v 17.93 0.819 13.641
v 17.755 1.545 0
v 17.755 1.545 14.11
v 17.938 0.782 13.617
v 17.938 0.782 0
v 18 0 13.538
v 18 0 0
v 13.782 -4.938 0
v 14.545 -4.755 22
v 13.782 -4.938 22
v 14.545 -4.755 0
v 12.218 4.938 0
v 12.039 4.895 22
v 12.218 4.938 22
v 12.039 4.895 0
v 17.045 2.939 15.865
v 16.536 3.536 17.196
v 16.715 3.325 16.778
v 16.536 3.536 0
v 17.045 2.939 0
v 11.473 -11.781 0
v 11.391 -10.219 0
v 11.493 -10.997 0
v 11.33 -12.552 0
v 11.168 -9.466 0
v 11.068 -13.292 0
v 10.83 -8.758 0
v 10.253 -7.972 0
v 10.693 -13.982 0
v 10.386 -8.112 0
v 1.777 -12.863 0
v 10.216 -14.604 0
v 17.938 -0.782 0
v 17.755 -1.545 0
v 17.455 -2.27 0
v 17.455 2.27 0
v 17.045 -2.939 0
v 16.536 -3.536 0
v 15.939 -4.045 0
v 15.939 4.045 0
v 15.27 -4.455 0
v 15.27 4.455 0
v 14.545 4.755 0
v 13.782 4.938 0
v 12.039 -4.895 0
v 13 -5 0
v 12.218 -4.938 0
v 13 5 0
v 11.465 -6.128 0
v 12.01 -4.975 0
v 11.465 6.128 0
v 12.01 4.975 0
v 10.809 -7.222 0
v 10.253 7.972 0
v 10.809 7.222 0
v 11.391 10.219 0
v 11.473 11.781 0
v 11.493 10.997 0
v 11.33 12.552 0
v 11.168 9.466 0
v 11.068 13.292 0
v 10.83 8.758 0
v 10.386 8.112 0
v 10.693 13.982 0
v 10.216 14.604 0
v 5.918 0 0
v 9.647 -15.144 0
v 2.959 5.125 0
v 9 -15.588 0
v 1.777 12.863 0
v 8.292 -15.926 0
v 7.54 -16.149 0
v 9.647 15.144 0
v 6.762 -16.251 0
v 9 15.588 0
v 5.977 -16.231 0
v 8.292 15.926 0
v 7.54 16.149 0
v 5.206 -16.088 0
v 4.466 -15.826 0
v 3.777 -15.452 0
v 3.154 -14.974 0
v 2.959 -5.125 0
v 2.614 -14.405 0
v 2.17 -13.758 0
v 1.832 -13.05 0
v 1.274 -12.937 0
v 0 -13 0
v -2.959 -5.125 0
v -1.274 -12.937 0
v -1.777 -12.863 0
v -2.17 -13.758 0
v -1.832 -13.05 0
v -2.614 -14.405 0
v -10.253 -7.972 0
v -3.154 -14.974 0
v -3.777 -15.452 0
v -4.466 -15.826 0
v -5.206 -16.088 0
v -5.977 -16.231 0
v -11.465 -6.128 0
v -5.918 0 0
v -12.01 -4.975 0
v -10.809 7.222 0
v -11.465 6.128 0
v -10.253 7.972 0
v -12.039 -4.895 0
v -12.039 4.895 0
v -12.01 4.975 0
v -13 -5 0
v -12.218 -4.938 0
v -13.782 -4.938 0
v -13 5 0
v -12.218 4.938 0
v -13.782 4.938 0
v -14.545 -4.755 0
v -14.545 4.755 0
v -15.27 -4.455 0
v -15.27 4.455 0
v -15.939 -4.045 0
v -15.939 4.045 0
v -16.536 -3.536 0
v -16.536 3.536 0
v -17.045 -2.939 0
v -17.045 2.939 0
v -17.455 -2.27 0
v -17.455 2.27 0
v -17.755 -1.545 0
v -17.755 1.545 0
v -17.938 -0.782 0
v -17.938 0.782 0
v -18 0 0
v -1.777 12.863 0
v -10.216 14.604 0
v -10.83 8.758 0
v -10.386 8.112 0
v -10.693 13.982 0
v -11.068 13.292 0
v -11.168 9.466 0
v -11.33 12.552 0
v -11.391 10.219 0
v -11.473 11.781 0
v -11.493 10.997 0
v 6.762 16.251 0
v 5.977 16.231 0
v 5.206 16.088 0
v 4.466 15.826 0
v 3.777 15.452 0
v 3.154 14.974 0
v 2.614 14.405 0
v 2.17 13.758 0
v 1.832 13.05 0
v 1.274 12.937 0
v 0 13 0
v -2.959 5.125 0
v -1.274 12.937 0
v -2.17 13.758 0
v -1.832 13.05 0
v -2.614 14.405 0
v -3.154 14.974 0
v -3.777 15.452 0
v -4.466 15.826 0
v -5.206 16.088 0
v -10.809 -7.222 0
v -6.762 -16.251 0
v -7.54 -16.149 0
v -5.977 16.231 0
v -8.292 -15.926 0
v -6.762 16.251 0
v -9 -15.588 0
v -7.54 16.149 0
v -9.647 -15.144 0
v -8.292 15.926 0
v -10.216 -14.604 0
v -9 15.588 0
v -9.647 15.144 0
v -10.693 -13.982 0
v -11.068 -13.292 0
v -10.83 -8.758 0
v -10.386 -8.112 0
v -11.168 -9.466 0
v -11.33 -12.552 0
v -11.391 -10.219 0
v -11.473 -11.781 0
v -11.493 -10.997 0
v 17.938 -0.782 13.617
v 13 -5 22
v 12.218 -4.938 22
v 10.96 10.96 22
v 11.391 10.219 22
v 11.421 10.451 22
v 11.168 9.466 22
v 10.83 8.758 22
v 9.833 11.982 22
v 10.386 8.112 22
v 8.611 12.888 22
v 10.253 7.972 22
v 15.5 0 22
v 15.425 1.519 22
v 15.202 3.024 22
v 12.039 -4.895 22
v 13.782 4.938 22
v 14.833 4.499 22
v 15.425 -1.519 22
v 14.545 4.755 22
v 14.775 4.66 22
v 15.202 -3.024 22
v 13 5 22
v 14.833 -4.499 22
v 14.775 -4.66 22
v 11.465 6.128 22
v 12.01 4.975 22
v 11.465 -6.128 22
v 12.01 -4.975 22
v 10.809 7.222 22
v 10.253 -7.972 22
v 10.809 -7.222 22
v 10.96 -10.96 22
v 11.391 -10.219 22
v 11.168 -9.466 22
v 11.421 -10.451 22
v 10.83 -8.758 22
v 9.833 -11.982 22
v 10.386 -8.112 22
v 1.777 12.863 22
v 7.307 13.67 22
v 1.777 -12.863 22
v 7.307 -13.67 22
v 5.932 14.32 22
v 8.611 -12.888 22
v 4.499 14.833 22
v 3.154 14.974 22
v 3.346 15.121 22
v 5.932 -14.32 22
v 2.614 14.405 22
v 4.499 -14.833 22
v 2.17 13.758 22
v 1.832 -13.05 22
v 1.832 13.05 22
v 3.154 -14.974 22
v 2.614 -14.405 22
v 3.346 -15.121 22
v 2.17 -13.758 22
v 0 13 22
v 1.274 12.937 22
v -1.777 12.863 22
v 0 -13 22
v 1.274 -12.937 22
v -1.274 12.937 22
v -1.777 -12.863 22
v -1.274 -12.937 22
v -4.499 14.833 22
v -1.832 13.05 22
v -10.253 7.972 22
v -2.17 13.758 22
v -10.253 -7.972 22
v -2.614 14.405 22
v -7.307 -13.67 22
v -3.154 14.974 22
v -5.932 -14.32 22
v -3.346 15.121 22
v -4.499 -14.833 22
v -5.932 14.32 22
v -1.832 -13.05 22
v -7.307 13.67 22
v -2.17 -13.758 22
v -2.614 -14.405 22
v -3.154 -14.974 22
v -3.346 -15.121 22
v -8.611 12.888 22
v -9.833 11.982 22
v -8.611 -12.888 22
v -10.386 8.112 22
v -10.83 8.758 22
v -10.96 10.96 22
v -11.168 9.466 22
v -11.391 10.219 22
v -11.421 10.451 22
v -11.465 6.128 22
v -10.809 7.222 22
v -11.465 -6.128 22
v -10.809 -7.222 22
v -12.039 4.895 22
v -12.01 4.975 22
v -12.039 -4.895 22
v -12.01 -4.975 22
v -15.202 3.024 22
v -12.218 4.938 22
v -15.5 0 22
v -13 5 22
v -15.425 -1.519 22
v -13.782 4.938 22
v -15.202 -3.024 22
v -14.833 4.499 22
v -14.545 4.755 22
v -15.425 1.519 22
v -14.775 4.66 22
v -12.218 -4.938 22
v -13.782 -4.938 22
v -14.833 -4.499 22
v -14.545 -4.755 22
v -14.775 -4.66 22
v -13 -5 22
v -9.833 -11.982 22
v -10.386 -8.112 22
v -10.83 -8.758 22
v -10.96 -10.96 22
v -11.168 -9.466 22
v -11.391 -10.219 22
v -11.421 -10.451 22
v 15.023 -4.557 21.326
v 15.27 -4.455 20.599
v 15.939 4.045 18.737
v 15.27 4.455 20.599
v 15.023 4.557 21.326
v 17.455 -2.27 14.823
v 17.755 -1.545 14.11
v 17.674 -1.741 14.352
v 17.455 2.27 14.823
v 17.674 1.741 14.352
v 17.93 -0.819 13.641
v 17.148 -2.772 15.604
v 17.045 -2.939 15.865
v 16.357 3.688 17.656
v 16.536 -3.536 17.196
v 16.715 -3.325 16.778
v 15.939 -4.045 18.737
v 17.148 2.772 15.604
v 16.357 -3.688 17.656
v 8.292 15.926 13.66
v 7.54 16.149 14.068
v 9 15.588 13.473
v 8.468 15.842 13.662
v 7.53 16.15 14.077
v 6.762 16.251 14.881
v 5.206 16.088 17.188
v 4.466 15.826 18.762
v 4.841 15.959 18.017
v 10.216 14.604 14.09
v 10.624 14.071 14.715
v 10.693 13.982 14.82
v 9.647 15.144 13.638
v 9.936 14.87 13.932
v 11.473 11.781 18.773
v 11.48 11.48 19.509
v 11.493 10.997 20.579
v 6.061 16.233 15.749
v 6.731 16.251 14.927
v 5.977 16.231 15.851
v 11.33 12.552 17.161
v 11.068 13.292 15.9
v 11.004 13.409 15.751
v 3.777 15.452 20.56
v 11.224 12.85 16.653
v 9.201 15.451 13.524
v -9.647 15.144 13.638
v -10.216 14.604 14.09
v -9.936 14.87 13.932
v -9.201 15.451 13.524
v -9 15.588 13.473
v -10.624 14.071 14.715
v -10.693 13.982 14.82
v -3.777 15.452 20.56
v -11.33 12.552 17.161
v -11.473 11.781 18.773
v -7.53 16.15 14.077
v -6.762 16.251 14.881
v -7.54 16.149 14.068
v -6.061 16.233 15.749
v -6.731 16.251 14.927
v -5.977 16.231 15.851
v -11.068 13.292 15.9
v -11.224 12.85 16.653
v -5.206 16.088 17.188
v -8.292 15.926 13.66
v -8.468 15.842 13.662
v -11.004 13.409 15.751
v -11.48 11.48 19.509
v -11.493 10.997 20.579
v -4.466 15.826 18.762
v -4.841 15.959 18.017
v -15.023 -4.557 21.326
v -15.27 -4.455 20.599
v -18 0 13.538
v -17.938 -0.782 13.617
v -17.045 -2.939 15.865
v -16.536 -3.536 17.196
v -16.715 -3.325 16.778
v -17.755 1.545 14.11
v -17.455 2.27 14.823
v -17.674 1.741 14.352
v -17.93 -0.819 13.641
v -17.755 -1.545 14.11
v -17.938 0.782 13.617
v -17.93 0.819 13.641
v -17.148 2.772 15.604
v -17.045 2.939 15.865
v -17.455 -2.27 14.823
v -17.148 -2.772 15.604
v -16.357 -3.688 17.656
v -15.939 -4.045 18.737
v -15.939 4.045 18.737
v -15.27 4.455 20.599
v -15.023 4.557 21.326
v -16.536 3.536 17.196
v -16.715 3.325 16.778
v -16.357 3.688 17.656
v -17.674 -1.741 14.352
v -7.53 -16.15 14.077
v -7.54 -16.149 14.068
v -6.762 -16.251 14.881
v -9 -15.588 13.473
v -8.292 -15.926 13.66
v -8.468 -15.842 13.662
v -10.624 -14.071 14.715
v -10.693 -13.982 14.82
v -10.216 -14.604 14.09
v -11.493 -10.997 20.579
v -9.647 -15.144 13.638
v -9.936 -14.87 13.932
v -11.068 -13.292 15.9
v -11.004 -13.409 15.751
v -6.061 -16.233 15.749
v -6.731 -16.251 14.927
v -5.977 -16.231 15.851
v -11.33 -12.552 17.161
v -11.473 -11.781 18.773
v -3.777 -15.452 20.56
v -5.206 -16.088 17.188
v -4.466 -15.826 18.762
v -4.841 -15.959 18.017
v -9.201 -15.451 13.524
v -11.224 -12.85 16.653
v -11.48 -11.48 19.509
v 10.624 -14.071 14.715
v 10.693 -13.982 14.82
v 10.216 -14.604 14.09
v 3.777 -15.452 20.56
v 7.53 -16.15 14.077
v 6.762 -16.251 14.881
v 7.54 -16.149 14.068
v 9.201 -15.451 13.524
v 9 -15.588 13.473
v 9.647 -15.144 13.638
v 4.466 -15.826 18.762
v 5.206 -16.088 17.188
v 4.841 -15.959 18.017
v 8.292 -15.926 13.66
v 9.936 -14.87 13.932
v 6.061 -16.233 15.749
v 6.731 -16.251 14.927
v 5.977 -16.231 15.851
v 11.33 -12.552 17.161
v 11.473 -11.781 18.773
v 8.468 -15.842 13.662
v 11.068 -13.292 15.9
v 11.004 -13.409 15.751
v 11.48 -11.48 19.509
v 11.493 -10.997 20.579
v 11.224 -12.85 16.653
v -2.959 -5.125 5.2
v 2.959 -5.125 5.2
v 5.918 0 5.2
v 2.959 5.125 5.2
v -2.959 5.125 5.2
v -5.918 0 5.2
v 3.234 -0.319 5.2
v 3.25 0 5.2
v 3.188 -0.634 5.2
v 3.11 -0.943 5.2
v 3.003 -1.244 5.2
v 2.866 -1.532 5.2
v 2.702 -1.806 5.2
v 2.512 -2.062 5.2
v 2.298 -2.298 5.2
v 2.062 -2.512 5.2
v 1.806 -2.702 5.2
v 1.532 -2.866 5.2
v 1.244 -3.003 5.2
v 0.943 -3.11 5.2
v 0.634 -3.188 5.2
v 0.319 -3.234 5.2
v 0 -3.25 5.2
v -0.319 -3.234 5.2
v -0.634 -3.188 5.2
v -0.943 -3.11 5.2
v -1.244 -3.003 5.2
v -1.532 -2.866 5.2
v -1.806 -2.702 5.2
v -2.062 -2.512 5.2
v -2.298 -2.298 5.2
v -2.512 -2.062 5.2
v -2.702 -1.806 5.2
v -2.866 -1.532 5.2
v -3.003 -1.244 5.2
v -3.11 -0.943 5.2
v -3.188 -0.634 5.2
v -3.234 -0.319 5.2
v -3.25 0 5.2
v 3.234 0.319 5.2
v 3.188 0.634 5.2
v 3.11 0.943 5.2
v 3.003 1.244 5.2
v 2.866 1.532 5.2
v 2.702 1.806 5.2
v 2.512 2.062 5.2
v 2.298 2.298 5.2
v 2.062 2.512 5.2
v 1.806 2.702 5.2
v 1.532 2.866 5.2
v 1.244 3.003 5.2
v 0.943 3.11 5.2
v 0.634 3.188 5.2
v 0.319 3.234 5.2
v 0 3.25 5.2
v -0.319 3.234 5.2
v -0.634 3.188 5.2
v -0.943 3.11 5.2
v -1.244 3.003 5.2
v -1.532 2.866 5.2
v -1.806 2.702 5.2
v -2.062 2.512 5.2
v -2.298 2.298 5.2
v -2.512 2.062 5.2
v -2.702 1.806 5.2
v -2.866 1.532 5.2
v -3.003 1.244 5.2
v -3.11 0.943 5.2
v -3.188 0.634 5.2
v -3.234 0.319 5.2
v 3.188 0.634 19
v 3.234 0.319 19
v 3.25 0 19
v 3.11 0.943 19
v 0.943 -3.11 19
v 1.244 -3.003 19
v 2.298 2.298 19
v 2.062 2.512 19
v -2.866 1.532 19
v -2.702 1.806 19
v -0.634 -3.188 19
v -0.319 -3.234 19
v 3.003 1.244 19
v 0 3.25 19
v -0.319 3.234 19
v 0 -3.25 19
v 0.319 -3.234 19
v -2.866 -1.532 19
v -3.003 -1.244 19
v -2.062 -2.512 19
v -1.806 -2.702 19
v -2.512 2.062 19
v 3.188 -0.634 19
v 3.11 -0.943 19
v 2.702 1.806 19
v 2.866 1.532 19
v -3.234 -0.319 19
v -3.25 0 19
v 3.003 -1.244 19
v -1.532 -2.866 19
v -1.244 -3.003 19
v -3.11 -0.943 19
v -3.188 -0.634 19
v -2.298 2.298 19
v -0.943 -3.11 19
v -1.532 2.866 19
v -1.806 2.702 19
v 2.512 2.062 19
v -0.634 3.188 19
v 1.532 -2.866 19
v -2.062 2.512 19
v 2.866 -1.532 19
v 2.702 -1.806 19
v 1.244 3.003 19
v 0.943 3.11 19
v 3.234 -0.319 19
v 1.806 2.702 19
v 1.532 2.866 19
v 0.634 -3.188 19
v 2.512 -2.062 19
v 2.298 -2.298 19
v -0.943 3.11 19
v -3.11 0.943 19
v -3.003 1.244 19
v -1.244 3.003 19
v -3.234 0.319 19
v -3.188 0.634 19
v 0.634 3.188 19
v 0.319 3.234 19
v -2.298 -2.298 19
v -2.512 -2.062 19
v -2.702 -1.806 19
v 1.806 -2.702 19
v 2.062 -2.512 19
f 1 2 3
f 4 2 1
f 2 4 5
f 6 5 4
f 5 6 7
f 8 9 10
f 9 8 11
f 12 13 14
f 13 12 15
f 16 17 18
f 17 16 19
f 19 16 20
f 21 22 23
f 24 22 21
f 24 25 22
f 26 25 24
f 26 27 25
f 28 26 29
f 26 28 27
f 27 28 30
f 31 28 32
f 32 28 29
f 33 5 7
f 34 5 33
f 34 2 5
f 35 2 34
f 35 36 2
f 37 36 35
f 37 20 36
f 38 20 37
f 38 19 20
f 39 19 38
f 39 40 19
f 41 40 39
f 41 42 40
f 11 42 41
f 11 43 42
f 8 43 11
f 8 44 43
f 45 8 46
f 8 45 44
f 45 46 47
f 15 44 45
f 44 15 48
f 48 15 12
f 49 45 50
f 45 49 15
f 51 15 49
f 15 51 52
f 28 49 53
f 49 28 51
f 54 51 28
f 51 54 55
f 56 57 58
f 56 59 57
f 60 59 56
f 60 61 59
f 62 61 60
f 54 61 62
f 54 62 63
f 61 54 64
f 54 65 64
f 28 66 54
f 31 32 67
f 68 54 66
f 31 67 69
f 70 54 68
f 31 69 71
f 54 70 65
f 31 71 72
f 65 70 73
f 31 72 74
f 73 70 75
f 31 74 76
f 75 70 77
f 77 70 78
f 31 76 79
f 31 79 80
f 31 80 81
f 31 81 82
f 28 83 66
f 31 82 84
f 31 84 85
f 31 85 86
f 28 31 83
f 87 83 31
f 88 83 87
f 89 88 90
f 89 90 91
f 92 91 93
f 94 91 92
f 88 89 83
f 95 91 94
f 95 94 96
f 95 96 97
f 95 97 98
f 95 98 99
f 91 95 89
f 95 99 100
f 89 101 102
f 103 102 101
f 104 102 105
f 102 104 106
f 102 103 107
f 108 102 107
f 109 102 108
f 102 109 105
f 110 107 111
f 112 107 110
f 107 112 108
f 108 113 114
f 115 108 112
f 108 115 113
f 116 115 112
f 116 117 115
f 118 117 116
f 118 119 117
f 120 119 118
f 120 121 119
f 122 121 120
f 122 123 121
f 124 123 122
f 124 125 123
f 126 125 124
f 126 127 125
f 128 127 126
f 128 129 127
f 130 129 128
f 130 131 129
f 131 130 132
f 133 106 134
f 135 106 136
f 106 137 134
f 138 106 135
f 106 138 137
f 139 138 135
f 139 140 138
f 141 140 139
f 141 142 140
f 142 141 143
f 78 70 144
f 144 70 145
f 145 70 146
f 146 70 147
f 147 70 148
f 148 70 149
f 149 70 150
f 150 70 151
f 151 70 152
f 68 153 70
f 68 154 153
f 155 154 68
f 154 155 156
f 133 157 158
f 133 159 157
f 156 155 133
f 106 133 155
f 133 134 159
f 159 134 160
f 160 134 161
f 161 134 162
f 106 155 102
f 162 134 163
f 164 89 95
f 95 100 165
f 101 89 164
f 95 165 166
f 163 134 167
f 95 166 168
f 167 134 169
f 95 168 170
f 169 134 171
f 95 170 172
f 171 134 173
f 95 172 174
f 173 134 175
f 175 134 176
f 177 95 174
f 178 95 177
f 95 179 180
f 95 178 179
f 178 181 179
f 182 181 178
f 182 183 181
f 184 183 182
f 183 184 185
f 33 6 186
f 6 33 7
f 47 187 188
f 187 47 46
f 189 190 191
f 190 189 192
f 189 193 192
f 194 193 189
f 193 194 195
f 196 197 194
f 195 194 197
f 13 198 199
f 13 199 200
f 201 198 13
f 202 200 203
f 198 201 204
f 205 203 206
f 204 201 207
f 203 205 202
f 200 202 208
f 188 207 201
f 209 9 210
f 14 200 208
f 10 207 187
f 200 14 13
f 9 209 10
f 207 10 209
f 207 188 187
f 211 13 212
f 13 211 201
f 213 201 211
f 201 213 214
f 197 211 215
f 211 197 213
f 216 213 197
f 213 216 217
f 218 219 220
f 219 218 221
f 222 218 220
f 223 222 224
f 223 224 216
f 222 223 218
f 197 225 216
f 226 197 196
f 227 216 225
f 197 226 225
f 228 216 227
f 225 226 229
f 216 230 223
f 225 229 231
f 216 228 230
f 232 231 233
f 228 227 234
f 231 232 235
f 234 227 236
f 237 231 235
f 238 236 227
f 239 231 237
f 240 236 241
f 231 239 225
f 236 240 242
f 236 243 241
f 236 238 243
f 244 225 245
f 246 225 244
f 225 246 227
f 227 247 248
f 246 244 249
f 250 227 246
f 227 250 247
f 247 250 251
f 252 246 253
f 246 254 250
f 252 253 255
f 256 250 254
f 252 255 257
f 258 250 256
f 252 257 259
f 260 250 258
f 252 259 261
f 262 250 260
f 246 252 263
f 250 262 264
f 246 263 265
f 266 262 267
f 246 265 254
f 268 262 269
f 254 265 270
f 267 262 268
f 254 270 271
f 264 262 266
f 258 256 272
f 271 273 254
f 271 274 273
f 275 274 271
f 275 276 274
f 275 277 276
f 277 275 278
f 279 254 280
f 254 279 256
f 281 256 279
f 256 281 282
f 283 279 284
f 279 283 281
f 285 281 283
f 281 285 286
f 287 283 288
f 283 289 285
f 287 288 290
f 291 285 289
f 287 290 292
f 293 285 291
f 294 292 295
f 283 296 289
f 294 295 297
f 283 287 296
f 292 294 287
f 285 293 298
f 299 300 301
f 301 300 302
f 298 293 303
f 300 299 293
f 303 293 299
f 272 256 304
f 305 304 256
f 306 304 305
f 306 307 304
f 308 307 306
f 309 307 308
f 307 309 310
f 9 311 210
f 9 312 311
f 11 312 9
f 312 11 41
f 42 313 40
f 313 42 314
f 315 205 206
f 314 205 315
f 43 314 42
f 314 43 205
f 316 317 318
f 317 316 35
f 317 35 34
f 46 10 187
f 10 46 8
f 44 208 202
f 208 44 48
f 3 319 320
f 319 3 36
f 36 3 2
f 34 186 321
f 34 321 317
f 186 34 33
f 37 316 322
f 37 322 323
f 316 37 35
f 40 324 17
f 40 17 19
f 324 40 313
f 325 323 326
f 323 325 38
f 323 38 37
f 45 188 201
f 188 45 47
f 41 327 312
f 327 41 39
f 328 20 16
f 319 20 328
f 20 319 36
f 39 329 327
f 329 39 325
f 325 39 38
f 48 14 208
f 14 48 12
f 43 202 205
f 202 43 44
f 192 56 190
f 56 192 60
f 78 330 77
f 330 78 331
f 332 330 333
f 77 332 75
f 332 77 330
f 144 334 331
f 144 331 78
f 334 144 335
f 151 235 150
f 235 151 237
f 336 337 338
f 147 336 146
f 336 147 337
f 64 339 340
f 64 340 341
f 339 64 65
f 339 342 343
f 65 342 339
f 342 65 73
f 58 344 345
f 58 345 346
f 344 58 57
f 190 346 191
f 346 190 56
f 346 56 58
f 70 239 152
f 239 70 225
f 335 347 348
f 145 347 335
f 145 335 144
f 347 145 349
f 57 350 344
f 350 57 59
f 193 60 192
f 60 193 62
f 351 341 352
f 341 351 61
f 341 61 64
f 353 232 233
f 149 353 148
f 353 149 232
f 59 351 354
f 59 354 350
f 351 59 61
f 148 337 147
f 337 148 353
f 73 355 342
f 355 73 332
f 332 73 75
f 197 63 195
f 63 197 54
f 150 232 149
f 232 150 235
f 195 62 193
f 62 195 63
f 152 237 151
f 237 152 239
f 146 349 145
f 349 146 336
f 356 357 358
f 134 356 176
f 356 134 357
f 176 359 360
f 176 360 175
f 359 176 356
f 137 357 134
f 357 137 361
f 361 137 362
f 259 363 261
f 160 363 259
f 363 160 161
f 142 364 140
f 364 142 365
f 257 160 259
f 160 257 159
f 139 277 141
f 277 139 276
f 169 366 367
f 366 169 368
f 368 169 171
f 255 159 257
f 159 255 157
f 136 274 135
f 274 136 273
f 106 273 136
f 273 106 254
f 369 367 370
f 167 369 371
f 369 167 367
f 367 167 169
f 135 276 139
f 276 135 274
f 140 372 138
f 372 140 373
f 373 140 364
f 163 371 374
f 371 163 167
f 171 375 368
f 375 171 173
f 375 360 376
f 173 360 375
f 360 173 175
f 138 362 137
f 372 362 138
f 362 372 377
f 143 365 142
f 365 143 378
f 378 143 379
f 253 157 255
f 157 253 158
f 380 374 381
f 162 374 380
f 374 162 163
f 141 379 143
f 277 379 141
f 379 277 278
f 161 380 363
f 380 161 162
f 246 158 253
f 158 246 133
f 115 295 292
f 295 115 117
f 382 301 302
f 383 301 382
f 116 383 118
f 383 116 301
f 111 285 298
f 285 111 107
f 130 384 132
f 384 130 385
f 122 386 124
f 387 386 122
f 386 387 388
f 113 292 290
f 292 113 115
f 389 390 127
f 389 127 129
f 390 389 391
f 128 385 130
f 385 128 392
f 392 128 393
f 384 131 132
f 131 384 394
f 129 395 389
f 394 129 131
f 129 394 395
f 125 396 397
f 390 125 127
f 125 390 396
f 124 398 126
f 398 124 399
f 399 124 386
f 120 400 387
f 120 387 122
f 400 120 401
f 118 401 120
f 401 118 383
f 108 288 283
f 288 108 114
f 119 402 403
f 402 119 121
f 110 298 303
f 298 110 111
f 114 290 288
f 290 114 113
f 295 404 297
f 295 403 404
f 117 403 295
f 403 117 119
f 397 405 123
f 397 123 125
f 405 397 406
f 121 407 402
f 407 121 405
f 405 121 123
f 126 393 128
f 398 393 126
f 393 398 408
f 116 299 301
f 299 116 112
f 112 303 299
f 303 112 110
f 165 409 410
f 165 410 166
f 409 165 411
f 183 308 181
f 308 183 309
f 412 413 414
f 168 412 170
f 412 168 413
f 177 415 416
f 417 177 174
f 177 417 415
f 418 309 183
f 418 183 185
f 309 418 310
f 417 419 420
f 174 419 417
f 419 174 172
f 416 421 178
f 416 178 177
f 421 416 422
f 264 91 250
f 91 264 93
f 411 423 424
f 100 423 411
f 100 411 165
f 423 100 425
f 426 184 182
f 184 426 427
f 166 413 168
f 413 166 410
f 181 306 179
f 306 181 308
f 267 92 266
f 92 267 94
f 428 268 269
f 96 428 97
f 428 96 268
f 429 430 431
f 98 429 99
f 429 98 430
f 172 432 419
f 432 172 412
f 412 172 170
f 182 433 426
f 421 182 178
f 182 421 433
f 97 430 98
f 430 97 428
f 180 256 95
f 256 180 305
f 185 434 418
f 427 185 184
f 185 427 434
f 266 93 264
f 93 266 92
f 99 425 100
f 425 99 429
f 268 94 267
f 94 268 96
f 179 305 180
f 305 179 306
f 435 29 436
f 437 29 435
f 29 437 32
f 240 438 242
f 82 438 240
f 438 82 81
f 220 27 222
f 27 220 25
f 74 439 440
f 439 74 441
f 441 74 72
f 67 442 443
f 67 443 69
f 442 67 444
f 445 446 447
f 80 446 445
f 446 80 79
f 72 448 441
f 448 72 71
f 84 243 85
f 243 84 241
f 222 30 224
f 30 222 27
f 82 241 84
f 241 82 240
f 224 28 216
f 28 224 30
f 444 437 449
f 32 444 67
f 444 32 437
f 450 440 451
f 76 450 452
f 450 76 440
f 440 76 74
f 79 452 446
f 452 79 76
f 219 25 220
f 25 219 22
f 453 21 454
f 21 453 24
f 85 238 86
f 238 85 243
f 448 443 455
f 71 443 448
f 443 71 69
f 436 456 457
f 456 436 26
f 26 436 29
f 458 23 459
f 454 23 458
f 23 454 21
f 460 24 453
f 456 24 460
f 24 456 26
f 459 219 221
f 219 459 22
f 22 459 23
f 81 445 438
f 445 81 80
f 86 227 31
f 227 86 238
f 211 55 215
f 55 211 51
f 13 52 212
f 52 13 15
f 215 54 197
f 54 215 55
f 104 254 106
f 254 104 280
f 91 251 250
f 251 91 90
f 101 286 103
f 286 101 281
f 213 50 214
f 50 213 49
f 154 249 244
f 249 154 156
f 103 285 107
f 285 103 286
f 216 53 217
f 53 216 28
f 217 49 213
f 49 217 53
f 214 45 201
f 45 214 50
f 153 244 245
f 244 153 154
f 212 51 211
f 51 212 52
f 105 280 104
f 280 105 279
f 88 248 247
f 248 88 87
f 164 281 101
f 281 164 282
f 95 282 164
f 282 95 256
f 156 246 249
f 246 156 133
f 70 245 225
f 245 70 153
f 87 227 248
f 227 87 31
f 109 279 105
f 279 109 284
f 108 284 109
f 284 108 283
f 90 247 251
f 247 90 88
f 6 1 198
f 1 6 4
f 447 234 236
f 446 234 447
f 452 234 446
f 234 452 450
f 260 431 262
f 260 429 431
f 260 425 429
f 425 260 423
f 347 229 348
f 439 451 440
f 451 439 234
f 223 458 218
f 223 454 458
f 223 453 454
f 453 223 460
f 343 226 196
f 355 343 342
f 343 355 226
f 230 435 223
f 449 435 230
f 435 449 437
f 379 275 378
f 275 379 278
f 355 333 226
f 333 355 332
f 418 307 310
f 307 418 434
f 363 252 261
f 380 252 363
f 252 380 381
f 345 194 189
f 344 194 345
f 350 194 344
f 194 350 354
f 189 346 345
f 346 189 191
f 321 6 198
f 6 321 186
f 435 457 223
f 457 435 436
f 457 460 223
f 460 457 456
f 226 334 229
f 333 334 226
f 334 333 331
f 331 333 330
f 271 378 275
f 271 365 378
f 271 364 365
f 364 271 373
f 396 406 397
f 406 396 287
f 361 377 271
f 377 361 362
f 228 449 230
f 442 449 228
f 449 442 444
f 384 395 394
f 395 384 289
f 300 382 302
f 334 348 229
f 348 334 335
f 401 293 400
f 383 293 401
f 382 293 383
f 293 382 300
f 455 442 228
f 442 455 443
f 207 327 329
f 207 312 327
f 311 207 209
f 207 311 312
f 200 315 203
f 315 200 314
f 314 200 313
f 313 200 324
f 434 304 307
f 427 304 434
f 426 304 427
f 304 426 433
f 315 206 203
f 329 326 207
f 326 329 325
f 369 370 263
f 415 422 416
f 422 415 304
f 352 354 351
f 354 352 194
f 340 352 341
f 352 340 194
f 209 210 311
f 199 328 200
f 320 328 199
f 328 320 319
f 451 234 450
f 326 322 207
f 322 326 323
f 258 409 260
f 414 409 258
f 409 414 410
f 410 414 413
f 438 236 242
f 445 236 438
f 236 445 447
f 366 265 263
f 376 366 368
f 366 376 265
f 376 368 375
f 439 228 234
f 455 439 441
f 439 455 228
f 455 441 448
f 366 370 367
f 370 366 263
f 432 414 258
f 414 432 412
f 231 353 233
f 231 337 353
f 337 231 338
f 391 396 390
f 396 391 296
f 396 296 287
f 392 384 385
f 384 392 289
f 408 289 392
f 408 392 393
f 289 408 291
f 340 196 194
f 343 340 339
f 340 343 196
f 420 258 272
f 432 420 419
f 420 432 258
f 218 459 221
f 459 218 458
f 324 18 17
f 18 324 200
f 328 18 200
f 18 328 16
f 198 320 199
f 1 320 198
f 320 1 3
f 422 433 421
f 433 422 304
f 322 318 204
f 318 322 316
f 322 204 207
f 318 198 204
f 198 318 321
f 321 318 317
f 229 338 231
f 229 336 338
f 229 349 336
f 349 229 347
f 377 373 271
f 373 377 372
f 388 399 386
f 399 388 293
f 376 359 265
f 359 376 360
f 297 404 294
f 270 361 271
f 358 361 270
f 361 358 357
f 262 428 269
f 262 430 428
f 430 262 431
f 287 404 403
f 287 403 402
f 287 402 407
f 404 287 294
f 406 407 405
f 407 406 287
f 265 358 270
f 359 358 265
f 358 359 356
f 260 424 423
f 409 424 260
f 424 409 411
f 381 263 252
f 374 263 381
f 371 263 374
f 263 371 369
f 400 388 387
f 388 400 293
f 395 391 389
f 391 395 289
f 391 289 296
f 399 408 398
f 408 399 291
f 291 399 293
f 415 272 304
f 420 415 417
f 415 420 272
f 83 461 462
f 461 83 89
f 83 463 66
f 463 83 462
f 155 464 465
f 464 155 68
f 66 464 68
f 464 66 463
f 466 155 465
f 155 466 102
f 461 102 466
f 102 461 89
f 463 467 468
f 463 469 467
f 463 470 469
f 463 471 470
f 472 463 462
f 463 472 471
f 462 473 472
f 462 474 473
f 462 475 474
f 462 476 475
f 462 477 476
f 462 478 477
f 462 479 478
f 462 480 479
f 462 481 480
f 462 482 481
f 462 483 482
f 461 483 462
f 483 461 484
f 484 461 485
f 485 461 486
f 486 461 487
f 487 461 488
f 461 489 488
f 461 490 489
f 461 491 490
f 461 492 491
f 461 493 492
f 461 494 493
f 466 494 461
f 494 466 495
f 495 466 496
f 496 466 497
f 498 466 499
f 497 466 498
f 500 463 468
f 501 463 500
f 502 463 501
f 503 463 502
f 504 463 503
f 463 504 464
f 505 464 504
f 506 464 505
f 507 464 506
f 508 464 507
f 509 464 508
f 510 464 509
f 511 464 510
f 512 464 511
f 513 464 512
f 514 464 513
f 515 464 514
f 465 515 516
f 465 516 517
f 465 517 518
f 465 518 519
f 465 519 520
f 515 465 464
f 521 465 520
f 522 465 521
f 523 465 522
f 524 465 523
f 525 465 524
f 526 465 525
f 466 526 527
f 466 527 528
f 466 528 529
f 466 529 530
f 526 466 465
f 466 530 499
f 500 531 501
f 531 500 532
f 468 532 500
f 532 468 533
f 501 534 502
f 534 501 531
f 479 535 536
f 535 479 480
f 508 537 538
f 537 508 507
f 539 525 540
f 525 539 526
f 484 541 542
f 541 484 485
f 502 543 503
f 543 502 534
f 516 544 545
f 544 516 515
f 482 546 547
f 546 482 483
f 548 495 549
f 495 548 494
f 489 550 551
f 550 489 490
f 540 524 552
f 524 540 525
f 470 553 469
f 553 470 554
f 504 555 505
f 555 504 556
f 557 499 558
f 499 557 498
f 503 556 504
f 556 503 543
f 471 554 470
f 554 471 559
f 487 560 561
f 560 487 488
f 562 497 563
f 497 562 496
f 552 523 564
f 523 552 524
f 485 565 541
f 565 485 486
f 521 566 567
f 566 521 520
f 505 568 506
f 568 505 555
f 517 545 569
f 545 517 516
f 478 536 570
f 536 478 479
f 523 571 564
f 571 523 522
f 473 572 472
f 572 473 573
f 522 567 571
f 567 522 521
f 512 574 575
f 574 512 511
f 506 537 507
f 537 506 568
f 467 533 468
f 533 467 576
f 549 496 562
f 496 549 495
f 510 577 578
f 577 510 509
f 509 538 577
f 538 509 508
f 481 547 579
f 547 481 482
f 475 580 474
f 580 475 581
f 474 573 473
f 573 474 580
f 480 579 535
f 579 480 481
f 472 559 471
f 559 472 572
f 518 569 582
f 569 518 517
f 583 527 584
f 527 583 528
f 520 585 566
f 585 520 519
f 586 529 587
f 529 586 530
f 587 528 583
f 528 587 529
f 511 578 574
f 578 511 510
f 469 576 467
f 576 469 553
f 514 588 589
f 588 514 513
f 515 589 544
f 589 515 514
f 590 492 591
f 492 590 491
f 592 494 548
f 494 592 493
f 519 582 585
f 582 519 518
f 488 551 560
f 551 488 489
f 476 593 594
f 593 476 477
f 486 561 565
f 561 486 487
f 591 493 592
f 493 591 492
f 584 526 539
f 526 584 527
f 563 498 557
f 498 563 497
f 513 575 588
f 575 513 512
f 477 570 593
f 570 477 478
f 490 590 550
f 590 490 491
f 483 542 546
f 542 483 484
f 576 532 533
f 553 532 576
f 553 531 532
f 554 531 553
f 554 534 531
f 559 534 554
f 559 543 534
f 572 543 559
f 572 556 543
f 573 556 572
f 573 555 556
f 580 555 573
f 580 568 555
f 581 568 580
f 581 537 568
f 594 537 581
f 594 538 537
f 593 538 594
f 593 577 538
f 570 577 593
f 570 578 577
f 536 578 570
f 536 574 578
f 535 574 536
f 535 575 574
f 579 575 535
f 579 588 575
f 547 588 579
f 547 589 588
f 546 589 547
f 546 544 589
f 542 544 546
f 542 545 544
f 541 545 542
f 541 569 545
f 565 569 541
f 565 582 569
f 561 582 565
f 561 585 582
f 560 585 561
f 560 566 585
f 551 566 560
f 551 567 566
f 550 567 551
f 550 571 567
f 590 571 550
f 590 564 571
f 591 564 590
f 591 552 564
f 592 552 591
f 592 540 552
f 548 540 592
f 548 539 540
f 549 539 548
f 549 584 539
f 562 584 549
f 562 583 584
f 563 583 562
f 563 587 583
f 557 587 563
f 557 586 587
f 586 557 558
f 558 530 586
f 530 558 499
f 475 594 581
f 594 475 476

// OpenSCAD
// Hold-down knob for the corner units: replaces a wing nut and penny washer.
// Press an M6 nut into the hex pocket underneath, then screw the knob down onto
// the stud that holds the corner unit to the table. Print flat face down.
// PETG, 4 to 5 walls, 40 to 50% infill, no supports.

height   = 22;     // overall height
core_r   = 13;     // centre of the knob
lobe_r   = 5;      // the six finger lobes
lobe_at  = 13;     // how far out the lobes sit
top_r    = 15.5;   // the sides taper in to this radius at the top
nut_af   = 10.25;  // M6 nut across flats, plus clearance for a press fit
nut_deep = 5.2;    // M6 nut thickness, plus a little
bore_d   = 6.5;    // clearance for the M6 stud
roof     = 3;      // solid top above the stud

$fn = 64;

module hold_down_knob() {
    difference() {
        intersection() {
            union() {
                cylinder(h = height, r = core_r);
                for (i = [0 : 5])
                    rotate([0, 0, 60 * i]) translate([lobe_at, 0, 0]) cylinder(h = height, r = lobe_r, $fn = 40);
            }
            cylinder(h = height, r1 = 22, r2 = top_r);
        }
        // M6 nut pocket, open at the bottom
        translate([0, 0, -1]) cylinder(h = nut_deep + 1, r = nut_af / sqrt(3), $fn = 6);
        // stud clearance, closed at the top
        translate([0, 0, -1]) cylinder(h = height - roof + 1, d = bore_d);
    }
}

hold_down_knob();
